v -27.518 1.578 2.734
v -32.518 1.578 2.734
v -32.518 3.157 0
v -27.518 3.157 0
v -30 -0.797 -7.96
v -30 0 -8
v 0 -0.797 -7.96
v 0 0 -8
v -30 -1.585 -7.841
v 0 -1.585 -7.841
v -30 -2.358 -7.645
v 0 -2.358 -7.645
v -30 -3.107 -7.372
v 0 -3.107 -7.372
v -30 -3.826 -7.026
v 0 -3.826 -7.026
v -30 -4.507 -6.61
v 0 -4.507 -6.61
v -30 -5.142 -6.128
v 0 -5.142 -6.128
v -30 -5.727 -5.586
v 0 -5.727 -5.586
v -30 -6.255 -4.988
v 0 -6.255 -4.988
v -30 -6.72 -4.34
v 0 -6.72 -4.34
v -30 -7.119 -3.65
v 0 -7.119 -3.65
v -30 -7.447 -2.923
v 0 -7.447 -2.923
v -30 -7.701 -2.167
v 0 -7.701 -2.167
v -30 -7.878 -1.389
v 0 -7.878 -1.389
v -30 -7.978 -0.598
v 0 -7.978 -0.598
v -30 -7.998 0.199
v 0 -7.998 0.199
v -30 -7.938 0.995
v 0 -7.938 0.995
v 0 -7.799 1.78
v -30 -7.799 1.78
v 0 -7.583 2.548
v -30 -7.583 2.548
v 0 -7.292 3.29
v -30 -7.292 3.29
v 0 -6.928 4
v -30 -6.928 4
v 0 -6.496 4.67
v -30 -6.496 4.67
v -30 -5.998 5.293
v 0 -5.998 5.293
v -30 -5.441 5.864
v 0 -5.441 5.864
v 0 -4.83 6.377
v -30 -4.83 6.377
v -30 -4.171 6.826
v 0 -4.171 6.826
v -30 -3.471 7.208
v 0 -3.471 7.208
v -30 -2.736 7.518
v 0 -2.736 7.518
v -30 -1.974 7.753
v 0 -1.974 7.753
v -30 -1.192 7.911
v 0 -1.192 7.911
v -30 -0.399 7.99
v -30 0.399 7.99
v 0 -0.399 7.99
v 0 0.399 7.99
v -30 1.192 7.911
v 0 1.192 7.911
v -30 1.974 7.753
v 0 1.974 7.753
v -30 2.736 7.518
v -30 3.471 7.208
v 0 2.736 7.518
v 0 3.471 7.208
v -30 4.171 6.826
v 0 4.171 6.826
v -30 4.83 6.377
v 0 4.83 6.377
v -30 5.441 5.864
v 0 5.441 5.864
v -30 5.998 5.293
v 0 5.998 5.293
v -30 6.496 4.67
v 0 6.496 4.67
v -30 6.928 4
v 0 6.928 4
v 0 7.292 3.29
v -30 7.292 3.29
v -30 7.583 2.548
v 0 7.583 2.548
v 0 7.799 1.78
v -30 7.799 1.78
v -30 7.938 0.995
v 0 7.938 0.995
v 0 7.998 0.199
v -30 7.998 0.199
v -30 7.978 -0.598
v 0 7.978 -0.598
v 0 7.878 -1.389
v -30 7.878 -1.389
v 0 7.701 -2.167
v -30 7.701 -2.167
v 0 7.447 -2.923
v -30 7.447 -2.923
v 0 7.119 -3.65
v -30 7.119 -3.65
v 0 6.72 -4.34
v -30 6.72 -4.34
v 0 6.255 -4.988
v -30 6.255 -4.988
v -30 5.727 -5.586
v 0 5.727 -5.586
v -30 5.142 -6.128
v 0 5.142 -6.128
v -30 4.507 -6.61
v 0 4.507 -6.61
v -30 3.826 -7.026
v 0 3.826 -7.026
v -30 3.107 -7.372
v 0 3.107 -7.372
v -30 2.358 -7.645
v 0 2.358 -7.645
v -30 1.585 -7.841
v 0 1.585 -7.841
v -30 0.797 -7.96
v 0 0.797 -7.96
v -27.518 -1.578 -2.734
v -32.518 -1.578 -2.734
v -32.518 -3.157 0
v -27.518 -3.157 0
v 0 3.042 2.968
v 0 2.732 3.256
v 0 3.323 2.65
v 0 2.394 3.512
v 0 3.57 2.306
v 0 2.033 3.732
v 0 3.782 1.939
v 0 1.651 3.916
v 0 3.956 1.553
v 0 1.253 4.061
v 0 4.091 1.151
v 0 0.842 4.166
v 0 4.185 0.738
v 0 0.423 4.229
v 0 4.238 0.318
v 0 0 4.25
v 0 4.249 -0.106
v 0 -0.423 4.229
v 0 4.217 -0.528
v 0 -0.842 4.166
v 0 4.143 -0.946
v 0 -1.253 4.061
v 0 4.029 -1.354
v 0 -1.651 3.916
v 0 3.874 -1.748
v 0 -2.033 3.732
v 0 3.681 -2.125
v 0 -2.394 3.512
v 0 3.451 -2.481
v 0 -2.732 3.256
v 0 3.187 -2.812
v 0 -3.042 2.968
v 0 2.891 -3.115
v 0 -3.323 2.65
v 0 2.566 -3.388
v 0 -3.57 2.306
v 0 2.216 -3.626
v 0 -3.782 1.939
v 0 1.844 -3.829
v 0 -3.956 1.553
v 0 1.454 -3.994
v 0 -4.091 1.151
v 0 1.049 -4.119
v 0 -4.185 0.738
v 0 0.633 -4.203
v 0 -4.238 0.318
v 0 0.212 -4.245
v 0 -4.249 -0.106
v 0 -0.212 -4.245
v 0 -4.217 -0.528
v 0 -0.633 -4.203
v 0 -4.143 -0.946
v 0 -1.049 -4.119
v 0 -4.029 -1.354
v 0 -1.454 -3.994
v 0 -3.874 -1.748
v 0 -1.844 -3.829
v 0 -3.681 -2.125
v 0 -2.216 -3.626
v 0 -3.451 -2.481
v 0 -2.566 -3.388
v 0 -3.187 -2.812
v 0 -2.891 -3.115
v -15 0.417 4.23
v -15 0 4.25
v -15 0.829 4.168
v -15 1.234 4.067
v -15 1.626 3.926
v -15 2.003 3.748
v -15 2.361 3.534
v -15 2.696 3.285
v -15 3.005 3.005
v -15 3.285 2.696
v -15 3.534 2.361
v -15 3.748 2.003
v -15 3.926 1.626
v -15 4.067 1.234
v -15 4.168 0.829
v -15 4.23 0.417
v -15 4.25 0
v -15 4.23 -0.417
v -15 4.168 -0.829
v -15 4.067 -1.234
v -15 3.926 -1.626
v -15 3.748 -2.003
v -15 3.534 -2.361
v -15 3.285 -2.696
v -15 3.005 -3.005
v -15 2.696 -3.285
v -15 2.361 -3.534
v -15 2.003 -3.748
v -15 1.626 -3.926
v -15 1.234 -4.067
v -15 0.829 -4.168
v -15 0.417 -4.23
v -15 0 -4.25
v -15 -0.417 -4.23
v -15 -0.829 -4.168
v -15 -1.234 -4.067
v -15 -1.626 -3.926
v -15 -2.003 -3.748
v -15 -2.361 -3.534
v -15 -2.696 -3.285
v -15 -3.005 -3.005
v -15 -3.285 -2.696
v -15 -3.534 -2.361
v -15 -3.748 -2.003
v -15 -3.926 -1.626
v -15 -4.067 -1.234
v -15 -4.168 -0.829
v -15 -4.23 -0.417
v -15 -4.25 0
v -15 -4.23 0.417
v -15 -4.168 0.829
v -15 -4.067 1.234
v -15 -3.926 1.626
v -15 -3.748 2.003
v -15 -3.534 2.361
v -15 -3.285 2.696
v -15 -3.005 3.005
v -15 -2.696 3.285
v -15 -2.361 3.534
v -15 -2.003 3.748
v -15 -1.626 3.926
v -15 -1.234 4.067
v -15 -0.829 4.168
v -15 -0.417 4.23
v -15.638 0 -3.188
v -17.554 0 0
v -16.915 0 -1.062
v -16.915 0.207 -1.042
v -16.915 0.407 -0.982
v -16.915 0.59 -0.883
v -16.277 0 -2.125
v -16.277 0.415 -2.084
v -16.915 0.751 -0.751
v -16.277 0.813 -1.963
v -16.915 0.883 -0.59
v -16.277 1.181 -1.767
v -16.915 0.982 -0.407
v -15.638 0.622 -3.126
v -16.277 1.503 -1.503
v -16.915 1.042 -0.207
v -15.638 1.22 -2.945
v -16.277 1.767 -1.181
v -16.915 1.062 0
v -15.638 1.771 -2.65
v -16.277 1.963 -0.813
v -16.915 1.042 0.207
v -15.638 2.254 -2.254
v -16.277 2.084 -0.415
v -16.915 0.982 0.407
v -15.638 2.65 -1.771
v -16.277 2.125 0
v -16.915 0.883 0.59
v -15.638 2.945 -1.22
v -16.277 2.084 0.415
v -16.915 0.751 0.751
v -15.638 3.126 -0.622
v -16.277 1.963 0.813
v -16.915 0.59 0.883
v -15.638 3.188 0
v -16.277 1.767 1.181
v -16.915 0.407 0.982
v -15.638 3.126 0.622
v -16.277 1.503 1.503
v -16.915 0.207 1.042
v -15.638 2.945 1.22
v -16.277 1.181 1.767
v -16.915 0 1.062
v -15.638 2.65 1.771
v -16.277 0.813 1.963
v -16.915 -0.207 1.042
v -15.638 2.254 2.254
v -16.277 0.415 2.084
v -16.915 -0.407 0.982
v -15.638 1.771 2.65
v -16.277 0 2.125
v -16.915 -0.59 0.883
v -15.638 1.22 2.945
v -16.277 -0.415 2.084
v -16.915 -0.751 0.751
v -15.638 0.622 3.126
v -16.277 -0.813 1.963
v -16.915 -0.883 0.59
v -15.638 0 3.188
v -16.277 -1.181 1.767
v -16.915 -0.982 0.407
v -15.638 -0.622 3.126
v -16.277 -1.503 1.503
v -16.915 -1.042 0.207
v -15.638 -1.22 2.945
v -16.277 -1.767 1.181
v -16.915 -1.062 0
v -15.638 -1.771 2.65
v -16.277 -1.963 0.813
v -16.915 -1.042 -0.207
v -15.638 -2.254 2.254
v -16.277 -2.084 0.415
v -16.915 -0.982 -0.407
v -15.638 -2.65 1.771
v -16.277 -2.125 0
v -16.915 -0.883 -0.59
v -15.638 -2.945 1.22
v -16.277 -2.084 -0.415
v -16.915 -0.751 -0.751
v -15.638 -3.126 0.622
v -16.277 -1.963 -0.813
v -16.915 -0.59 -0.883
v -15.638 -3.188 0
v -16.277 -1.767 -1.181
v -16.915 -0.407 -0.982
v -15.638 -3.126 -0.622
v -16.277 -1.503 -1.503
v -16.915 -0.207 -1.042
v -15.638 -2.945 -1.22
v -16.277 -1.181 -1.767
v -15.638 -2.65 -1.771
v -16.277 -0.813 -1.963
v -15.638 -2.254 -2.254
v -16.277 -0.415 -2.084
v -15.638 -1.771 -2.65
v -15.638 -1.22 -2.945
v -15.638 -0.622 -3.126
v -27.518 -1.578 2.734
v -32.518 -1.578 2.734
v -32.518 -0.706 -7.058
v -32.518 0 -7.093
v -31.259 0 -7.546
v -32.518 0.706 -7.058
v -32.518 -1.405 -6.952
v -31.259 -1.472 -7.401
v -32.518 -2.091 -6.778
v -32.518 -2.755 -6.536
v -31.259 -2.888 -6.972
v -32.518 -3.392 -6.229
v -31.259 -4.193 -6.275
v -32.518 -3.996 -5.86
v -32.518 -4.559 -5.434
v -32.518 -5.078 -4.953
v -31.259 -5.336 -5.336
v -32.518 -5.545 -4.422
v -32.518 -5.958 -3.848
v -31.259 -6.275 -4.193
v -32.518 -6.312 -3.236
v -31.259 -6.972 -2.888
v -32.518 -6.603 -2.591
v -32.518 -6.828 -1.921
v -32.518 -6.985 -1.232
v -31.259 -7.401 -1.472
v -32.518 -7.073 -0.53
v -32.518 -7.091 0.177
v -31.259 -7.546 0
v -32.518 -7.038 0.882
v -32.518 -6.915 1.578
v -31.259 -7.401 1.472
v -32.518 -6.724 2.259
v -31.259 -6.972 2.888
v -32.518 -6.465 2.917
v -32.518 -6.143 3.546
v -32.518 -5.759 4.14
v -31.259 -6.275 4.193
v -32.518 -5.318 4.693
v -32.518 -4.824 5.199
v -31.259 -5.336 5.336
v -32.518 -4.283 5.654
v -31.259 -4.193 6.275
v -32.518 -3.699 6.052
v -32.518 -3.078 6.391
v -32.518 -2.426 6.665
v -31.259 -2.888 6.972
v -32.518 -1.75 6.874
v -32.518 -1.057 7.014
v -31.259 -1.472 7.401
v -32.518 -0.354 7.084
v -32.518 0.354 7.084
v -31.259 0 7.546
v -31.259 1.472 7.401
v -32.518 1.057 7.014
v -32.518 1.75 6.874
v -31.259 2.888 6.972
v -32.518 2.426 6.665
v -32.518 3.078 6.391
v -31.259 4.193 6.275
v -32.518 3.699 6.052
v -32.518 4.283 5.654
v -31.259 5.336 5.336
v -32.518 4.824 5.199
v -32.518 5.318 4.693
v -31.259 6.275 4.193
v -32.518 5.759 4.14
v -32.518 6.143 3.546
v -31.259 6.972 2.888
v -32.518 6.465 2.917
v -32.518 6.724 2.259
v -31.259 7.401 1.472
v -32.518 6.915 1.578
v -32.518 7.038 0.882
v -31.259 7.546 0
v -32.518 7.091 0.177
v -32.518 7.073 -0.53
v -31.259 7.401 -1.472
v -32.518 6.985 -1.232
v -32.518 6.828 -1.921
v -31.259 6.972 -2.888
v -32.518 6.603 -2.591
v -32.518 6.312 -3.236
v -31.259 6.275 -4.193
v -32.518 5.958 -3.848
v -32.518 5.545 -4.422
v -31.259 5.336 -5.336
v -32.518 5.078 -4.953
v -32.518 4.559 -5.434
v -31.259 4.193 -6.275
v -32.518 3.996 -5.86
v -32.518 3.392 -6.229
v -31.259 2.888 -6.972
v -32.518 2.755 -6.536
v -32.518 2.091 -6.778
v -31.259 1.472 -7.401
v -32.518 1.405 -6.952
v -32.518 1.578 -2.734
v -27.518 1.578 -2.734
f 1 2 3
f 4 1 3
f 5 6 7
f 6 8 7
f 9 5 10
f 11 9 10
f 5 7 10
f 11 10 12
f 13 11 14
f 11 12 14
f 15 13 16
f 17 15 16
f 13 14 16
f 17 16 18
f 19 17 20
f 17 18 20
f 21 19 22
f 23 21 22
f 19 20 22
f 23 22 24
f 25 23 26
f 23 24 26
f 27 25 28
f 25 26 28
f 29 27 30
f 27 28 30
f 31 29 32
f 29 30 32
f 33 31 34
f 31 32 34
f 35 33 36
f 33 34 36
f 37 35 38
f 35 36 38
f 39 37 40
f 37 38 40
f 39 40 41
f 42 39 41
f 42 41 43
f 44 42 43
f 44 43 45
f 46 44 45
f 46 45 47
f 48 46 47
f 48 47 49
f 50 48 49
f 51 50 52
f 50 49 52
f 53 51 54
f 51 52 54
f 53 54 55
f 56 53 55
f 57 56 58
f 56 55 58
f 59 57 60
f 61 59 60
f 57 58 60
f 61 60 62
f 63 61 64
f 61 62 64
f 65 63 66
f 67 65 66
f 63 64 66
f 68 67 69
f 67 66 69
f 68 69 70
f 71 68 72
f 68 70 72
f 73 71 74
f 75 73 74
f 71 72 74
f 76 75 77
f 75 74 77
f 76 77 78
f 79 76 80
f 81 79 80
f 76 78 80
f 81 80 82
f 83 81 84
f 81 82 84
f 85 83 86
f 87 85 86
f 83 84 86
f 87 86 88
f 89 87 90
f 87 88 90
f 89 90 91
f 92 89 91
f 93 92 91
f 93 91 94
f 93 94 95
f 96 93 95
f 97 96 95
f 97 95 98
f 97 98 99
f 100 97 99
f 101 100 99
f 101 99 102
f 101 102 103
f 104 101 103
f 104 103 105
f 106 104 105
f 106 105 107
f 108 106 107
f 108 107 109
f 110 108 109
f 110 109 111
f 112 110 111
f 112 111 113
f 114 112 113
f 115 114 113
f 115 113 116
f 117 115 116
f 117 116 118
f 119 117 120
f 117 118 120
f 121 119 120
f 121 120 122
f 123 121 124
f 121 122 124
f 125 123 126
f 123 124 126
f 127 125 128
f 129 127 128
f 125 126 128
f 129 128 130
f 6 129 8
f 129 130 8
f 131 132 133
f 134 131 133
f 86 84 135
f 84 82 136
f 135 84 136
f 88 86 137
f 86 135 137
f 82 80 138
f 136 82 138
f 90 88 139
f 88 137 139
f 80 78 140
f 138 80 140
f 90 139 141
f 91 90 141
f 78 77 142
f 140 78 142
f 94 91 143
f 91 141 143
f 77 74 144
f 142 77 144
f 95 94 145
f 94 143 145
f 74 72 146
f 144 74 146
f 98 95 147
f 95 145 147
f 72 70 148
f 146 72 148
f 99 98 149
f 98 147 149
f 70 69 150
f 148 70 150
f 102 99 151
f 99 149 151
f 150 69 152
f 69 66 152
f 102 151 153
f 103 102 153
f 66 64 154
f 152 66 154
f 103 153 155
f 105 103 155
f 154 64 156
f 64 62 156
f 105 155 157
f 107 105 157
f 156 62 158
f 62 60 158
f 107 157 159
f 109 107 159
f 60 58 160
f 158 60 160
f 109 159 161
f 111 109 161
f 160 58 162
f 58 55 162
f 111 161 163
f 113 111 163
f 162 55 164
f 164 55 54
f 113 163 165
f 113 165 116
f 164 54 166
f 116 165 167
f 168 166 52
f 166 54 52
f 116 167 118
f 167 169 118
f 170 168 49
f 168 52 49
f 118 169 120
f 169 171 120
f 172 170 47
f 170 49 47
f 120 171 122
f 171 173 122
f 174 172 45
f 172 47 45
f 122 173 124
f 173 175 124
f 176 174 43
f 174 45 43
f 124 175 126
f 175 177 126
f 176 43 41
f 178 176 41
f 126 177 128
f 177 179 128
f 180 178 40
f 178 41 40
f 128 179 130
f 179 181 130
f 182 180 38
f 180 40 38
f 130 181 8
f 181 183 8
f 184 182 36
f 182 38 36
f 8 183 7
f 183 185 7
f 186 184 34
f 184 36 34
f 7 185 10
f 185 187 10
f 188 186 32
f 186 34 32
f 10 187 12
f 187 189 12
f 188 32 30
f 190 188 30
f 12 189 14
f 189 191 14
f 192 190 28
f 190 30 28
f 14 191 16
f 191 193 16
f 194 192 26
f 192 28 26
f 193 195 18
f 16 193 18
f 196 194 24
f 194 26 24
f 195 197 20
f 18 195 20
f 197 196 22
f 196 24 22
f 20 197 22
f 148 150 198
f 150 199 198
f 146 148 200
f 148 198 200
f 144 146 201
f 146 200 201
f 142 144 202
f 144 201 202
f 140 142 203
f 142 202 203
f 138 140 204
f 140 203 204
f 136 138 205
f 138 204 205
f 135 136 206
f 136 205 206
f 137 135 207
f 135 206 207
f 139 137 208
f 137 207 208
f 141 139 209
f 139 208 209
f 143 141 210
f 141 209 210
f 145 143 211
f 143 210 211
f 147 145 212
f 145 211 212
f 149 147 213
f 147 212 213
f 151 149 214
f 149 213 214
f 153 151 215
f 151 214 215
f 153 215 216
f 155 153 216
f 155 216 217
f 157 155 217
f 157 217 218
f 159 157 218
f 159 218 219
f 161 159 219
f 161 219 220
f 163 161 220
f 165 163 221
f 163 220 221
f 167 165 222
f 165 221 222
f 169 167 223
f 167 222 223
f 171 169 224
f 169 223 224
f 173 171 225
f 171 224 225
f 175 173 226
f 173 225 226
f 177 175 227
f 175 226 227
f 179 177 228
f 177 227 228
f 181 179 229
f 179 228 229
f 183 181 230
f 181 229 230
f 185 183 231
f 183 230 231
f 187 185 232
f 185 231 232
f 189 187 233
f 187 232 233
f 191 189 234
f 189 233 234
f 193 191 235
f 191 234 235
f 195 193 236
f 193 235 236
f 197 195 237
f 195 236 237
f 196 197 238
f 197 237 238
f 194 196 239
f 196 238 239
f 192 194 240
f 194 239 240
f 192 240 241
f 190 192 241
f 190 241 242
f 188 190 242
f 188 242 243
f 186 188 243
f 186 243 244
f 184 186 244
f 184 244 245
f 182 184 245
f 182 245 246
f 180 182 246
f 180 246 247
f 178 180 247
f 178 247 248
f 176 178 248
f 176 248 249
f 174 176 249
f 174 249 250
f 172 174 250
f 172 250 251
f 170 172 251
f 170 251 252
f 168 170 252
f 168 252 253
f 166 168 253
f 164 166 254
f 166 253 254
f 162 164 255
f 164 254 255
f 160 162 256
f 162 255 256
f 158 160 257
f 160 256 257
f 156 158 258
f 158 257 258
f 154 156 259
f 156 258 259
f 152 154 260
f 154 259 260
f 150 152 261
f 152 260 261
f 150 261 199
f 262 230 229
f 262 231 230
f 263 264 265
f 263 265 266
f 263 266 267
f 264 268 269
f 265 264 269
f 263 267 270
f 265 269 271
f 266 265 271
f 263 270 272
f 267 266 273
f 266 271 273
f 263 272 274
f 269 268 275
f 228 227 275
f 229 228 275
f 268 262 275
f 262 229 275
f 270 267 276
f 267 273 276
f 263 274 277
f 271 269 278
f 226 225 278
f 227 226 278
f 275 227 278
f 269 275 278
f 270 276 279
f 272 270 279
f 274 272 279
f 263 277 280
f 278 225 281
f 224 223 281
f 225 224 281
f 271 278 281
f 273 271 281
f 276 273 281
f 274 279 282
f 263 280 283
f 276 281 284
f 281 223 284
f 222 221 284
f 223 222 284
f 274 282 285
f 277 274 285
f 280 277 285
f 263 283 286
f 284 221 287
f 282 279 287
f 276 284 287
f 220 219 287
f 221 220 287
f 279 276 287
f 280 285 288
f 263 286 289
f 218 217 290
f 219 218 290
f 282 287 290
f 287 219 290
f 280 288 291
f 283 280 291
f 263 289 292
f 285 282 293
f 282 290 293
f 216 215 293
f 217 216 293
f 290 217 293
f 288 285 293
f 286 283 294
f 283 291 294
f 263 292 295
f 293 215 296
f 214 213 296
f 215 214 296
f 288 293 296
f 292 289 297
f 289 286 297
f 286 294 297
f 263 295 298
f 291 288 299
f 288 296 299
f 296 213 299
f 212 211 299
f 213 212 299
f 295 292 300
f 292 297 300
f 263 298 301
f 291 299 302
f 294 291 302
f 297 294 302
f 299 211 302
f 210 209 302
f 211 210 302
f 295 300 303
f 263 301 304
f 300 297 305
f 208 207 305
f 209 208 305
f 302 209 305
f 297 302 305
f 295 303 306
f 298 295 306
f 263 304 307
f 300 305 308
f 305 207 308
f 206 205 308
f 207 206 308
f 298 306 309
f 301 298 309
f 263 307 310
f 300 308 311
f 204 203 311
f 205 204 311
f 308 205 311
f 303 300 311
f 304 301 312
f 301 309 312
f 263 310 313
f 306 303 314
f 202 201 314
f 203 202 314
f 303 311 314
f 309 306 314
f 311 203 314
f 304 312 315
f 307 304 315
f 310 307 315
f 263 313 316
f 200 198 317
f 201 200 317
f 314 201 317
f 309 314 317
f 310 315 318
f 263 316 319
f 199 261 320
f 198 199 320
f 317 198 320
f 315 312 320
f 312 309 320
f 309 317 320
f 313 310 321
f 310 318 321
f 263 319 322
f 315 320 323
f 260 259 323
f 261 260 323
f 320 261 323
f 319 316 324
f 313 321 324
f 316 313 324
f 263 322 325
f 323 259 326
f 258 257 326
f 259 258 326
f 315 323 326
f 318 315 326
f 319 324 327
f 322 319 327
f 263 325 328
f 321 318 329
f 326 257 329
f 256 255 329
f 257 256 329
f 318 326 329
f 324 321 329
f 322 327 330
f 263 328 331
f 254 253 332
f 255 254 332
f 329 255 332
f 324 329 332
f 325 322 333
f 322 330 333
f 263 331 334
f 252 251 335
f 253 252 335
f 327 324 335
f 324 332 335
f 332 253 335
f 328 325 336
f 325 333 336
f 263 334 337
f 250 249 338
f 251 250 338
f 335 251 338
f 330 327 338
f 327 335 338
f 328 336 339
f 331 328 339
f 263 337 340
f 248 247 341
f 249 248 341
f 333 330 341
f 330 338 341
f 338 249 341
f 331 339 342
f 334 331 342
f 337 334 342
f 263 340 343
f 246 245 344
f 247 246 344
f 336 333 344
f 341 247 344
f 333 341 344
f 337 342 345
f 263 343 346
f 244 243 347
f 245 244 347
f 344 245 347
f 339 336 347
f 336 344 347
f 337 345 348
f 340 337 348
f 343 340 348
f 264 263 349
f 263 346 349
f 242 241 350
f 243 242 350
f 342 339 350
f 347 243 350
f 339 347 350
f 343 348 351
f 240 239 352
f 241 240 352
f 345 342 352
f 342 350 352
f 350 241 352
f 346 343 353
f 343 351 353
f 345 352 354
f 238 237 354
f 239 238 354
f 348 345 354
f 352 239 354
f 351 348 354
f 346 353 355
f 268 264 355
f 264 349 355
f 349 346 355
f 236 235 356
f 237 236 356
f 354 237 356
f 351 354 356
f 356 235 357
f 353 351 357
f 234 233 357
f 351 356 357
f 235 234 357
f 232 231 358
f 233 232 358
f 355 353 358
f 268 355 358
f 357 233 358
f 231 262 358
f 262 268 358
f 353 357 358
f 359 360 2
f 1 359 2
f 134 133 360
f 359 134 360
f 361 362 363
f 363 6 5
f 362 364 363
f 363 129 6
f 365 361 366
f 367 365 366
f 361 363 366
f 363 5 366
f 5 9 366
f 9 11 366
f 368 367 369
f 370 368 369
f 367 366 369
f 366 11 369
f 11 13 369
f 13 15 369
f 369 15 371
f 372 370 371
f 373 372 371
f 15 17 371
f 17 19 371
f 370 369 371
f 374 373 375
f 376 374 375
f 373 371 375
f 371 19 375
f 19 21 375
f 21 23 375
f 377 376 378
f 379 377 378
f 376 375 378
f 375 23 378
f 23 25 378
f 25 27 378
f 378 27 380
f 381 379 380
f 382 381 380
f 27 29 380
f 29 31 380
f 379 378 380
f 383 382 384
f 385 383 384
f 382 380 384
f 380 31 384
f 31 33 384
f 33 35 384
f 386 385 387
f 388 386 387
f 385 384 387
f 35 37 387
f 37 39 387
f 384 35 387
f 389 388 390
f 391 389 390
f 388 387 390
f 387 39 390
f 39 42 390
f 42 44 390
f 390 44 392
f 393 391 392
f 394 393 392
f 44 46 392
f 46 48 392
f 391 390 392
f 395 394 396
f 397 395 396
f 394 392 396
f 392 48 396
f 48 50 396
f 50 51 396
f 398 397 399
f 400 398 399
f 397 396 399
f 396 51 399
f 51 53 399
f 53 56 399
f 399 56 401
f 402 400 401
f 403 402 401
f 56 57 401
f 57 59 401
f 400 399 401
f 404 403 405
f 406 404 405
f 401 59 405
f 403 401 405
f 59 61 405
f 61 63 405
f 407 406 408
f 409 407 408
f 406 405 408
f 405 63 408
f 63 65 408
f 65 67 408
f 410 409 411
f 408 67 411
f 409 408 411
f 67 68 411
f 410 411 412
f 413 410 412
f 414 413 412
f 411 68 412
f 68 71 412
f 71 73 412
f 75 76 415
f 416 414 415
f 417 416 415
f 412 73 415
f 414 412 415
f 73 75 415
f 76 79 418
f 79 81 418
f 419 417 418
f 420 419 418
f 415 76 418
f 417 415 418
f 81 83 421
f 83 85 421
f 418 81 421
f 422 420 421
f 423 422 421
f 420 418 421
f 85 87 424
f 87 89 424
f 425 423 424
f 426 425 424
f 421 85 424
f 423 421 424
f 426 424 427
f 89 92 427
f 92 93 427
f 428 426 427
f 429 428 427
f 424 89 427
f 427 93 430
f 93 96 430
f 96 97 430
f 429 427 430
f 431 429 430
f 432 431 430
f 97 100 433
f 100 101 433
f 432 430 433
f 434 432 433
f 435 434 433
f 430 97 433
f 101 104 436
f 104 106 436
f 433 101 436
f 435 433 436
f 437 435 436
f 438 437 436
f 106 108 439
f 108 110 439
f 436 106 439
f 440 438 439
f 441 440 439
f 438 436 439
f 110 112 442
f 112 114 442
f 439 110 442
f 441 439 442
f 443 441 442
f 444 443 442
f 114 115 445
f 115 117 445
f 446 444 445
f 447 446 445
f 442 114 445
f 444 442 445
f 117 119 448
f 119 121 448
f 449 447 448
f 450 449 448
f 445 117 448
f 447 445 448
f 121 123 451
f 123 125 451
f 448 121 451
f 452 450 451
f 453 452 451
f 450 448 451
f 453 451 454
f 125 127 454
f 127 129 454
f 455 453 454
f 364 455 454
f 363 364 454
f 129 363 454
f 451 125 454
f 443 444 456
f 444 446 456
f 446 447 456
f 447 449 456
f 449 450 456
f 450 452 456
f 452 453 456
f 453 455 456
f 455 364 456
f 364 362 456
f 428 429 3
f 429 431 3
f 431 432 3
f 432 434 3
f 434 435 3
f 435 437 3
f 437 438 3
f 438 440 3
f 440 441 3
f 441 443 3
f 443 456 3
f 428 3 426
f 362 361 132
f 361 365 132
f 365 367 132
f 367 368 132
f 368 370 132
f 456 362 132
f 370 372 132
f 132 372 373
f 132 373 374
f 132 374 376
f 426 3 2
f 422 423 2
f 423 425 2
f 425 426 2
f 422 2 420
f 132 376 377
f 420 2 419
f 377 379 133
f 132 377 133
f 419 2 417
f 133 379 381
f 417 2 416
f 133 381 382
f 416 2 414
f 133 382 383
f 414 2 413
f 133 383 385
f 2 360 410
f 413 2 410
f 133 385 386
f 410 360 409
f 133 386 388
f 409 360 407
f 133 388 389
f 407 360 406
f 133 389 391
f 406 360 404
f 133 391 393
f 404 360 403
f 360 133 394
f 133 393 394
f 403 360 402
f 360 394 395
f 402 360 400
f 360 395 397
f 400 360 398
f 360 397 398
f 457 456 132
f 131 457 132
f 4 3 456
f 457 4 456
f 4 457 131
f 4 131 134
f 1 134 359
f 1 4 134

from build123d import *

# Parameters (mm, degrees)
TALADRO_ROSCADO_M101_D     = 8.5
TALADRO_ROSCADO_M101_DEPTH = 15
TALADRO_ROSCADO_M101_TIP   = 2.553657631
CORTAR_EXTRUIR1_DEPTH      = 5


with BuildPart() as part:
    # Sketch1 → Revolve1 (revolve)
    with BuildSketch(Plane.XY, mode=Mode.PRIVATE) as revolve1_sk:
        Polygon((0, 0), (-32.518320182, 0), (-32.518320182, 7.092937258), (-30, 8), (0, 8), align=None)
    revolve(revolve1_sk.sketch.rotate(Axis((0, 0, 0), (-1, 0, 0)), 90), axis=Axis((0, 0, 0), (-1, 0, 0)))

    # Taladro roscado M101
    with Locations(Plane(origin=(0, 0, 0), x_dir=(0, 0, -1), z_dir=(1, 0, 0))):
        with Locations((0, 0)):
            Hole(TALADRO_ROSCADO_M101_D / 2, depth=TALADRO_ROSCADO_M101_DEPTH)
            with Locations((0, 0, -(TALADRO_ROSCADO_M101_DEPTH + TALADRO_ROSCADO_M101_TIP / 2))):  # 118° drill point
                Cone(0, TALADRO_ROSCADO_M101_D / 2, TALADRO_ROSCADO_M101_TIP, mode=Mode.SUBTRACT)

    # Croquis3 → Cortar-Extruir1 (cut)
    with BuildSketch(Plane.ZY.offset(32.518320182)):
        Polygon((0, -3.156760752), (2.733835005, -1.578380376), (2.733835005, 1.578380376), (0, 3.156760752), (-2.733835005, 1.578380376), (-2.733835005, -1.578380376), align=None)
    extrude(amount=-CORTAR_EXTRUIR1_DEPTH, mode=Mode.SUBTRACT)


solid = part.part
